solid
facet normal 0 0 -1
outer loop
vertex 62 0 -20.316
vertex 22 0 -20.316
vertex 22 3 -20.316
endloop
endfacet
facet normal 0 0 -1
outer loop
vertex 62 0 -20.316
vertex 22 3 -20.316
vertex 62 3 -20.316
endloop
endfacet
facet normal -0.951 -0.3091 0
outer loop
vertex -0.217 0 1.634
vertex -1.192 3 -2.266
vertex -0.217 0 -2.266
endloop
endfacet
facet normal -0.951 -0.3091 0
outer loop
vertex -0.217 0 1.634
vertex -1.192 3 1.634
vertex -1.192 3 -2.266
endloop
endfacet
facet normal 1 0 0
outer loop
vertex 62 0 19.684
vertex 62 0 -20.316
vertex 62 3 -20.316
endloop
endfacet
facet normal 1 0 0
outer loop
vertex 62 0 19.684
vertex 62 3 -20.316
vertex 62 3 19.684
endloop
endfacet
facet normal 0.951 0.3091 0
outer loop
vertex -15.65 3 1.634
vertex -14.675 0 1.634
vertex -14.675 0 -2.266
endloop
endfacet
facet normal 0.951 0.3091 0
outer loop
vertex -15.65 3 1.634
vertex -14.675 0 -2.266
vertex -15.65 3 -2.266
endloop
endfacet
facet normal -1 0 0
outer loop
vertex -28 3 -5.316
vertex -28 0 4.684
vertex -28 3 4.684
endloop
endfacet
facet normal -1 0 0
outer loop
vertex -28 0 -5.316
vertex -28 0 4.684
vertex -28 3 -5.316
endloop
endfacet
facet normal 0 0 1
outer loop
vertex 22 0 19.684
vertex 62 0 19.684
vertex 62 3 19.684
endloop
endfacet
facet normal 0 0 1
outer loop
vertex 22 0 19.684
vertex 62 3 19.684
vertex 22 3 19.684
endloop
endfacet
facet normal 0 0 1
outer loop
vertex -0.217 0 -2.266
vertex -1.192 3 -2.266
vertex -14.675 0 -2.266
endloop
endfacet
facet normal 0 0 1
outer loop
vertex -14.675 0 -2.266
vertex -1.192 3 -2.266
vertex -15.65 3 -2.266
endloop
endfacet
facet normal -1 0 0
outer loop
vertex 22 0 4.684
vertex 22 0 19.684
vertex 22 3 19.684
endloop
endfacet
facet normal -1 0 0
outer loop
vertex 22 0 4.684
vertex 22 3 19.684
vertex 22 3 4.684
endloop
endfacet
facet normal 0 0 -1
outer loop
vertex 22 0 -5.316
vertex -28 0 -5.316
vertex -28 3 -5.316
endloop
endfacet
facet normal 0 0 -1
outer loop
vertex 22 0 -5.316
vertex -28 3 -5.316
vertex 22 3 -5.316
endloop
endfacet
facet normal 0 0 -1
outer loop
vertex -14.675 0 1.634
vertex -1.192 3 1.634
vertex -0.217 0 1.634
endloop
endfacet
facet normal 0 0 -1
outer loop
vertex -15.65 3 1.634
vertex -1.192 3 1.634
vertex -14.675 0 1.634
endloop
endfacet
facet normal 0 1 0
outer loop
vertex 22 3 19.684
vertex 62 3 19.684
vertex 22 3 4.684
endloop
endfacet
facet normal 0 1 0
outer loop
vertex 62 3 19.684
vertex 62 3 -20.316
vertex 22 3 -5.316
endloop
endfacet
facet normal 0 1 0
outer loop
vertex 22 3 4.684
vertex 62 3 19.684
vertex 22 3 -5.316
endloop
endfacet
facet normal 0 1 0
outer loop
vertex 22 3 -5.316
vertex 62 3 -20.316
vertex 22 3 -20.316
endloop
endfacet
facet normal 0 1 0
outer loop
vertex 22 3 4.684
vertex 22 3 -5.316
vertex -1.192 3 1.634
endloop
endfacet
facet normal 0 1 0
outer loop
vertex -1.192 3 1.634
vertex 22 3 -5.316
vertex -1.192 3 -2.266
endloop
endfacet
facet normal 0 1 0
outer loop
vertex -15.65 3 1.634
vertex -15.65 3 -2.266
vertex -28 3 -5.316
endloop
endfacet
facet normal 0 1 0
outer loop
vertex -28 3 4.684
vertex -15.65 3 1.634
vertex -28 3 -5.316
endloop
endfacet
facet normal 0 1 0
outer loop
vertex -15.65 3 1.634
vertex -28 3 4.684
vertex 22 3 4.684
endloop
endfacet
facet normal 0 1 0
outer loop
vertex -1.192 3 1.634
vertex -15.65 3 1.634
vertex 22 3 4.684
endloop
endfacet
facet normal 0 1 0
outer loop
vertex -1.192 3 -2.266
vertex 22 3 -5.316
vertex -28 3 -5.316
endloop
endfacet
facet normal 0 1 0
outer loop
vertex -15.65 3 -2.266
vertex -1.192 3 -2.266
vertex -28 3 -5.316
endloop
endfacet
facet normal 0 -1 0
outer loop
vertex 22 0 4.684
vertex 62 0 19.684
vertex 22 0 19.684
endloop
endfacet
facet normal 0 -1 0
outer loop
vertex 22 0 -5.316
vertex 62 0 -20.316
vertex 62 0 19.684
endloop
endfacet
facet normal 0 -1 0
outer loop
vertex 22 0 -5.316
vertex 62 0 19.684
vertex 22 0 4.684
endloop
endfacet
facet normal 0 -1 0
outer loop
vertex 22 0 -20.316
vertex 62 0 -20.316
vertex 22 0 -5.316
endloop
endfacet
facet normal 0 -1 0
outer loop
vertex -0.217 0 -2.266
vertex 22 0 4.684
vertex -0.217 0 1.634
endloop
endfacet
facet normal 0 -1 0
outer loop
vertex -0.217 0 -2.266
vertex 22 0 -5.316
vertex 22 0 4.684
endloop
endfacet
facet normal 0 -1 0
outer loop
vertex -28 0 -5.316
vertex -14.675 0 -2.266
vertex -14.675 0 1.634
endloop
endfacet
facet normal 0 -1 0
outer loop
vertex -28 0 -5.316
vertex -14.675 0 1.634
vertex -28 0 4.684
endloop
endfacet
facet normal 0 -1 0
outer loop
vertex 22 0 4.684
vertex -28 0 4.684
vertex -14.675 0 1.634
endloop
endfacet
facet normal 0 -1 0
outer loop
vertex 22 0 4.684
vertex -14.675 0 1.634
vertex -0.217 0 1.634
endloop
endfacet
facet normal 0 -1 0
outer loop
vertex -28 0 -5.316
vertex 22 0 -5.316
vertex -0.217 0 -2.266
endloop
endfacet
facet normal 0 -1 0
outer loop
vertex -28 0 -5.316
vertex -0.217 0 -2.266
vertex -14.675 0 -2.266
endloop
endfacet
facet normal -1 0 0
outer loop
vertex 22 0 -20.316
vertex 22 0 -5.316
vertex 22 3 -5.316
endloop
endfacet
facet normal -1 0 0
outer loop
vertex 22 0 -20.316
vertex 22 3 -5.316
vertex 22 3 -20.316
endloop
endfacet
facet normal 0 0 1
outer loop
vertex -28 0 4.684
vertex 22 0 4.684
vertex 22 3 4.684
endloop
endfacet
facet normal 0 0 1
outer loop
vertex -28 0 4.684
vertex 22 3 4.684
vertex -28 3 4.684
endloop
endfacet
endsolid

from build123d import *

# Parameters (mm, degrees)
EXTRUDE_1_DEPTH     = 3
CUT_EXTRUDE_START   = -5
CUT_EXTRUDE_1_DEPTH = 1.95


with BuildPart() as part:
    # 草圖1 → 填料-伸長1 (new body)
    with BuildSketch(Plane(origin=(0, 0, 0), x_dir=(1, 0, 0), z_dir=(0, 1, 0))):
        Polygon((22, 5.315789474), (22, 20.315789474), (62, 20.315789474), (62, -19.684210526), (22, -19.684210526), (22, -4.684210526), (-28, -4.684210526), (-28, 5.315789474), align=None)
    extrude(amount=EXTRUDE_1_DEPTH)

    # 草圖3 → 除料-伸長1 (cut, symmetric)
    with BuildSketch(Plane.XY.offset(4.684210526).offset(CUT_EXTRUDE_START)):
        Polygon((-15.649759089, 3), (-1.192153505, 3), (-0.217394417, 0), (-14.675, 0), align=None)
    extrude(amount=CUT_EXTRUDE_1_DEPTH, both=True, mode=Mode.SUBTRACT)


solid = part.part
